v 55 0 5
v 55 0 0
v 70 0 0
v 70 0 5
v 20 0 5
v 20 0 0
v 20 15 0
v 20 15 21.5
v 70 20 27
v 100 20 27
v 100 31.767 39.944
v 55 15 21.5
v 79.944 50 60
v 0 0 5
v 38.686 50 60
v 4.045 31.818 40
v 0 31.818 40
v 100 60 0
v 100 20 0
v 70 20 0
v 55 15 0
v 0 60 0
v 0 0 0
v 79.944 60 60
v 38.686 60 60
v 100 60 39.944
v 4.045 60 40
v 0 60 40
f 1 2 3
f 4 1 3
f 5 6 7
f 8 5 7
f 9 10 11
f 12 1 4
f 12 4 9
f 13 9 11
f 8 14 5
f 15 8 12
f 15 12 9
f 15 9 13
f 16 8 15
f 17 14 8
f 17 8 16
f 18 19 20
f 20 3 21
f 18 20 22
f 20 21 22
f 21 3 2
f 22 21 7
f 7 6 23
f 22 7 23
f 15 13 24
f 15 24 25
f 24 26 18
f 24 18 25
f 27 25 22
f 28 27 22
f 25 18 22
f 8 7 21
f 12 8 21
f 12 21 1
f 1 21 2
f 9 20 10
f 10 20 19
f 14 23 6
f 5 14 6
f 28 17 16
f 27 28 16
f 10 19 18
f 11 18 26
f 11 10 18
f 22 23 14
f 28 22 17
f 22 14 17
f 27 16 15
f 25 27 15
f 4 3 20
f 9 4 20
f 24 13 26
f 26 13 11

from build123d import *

# Parameters (mm, degrees)
F1_DEPTH = 60
F2_DEPTH = 20
F4_DEPTH = 100.001
F6_DEPTH = 60.001


with BuildPart() as f1:
    # F0 (on Top) → F1 (new body)
    with BuildSketch(Plane.XY):
        Polygon((0, 40), (0, 0), (20, 0), (20, 15), (55, 15), (55, 0), (70, 0), (70, 20), (100, 20), (100, 40), align=None)
    extrude(amount=F1_DEPTH)

    # F2 (add): a face of the model
    f2_faces = [f1.faces().sort_by_distance(p)[0] for p in [
        (50, 40, 30),
    ]]
    extrude(f2_faces, amount=F2_DEPTH)

    # F3 (on Right) → F4 (cut, through all)
    with BuildSketch(Plane.YZ):
        Polygon((50, 60), (20, 60), (0, 60), (0, 5), align=None)
    extrude(amount=F4_DEPTH, mode=Mode.SUBTRACT)

    # F5 (on Front) → F6 (cut, through all)
    with BuildSketch(Plane.XZ):
        Polygon((0, 60), (0, 40), (4.0449425578, 40), (38.6859587092, 60), align=None)
        Polygon((100, 60), (79.9438208342, 60), (100, 39.9438208342), align=None)
    extrude(amount=-F6_DEPTH, mode=Mode.SUBTRACT)


solid = f1.part
